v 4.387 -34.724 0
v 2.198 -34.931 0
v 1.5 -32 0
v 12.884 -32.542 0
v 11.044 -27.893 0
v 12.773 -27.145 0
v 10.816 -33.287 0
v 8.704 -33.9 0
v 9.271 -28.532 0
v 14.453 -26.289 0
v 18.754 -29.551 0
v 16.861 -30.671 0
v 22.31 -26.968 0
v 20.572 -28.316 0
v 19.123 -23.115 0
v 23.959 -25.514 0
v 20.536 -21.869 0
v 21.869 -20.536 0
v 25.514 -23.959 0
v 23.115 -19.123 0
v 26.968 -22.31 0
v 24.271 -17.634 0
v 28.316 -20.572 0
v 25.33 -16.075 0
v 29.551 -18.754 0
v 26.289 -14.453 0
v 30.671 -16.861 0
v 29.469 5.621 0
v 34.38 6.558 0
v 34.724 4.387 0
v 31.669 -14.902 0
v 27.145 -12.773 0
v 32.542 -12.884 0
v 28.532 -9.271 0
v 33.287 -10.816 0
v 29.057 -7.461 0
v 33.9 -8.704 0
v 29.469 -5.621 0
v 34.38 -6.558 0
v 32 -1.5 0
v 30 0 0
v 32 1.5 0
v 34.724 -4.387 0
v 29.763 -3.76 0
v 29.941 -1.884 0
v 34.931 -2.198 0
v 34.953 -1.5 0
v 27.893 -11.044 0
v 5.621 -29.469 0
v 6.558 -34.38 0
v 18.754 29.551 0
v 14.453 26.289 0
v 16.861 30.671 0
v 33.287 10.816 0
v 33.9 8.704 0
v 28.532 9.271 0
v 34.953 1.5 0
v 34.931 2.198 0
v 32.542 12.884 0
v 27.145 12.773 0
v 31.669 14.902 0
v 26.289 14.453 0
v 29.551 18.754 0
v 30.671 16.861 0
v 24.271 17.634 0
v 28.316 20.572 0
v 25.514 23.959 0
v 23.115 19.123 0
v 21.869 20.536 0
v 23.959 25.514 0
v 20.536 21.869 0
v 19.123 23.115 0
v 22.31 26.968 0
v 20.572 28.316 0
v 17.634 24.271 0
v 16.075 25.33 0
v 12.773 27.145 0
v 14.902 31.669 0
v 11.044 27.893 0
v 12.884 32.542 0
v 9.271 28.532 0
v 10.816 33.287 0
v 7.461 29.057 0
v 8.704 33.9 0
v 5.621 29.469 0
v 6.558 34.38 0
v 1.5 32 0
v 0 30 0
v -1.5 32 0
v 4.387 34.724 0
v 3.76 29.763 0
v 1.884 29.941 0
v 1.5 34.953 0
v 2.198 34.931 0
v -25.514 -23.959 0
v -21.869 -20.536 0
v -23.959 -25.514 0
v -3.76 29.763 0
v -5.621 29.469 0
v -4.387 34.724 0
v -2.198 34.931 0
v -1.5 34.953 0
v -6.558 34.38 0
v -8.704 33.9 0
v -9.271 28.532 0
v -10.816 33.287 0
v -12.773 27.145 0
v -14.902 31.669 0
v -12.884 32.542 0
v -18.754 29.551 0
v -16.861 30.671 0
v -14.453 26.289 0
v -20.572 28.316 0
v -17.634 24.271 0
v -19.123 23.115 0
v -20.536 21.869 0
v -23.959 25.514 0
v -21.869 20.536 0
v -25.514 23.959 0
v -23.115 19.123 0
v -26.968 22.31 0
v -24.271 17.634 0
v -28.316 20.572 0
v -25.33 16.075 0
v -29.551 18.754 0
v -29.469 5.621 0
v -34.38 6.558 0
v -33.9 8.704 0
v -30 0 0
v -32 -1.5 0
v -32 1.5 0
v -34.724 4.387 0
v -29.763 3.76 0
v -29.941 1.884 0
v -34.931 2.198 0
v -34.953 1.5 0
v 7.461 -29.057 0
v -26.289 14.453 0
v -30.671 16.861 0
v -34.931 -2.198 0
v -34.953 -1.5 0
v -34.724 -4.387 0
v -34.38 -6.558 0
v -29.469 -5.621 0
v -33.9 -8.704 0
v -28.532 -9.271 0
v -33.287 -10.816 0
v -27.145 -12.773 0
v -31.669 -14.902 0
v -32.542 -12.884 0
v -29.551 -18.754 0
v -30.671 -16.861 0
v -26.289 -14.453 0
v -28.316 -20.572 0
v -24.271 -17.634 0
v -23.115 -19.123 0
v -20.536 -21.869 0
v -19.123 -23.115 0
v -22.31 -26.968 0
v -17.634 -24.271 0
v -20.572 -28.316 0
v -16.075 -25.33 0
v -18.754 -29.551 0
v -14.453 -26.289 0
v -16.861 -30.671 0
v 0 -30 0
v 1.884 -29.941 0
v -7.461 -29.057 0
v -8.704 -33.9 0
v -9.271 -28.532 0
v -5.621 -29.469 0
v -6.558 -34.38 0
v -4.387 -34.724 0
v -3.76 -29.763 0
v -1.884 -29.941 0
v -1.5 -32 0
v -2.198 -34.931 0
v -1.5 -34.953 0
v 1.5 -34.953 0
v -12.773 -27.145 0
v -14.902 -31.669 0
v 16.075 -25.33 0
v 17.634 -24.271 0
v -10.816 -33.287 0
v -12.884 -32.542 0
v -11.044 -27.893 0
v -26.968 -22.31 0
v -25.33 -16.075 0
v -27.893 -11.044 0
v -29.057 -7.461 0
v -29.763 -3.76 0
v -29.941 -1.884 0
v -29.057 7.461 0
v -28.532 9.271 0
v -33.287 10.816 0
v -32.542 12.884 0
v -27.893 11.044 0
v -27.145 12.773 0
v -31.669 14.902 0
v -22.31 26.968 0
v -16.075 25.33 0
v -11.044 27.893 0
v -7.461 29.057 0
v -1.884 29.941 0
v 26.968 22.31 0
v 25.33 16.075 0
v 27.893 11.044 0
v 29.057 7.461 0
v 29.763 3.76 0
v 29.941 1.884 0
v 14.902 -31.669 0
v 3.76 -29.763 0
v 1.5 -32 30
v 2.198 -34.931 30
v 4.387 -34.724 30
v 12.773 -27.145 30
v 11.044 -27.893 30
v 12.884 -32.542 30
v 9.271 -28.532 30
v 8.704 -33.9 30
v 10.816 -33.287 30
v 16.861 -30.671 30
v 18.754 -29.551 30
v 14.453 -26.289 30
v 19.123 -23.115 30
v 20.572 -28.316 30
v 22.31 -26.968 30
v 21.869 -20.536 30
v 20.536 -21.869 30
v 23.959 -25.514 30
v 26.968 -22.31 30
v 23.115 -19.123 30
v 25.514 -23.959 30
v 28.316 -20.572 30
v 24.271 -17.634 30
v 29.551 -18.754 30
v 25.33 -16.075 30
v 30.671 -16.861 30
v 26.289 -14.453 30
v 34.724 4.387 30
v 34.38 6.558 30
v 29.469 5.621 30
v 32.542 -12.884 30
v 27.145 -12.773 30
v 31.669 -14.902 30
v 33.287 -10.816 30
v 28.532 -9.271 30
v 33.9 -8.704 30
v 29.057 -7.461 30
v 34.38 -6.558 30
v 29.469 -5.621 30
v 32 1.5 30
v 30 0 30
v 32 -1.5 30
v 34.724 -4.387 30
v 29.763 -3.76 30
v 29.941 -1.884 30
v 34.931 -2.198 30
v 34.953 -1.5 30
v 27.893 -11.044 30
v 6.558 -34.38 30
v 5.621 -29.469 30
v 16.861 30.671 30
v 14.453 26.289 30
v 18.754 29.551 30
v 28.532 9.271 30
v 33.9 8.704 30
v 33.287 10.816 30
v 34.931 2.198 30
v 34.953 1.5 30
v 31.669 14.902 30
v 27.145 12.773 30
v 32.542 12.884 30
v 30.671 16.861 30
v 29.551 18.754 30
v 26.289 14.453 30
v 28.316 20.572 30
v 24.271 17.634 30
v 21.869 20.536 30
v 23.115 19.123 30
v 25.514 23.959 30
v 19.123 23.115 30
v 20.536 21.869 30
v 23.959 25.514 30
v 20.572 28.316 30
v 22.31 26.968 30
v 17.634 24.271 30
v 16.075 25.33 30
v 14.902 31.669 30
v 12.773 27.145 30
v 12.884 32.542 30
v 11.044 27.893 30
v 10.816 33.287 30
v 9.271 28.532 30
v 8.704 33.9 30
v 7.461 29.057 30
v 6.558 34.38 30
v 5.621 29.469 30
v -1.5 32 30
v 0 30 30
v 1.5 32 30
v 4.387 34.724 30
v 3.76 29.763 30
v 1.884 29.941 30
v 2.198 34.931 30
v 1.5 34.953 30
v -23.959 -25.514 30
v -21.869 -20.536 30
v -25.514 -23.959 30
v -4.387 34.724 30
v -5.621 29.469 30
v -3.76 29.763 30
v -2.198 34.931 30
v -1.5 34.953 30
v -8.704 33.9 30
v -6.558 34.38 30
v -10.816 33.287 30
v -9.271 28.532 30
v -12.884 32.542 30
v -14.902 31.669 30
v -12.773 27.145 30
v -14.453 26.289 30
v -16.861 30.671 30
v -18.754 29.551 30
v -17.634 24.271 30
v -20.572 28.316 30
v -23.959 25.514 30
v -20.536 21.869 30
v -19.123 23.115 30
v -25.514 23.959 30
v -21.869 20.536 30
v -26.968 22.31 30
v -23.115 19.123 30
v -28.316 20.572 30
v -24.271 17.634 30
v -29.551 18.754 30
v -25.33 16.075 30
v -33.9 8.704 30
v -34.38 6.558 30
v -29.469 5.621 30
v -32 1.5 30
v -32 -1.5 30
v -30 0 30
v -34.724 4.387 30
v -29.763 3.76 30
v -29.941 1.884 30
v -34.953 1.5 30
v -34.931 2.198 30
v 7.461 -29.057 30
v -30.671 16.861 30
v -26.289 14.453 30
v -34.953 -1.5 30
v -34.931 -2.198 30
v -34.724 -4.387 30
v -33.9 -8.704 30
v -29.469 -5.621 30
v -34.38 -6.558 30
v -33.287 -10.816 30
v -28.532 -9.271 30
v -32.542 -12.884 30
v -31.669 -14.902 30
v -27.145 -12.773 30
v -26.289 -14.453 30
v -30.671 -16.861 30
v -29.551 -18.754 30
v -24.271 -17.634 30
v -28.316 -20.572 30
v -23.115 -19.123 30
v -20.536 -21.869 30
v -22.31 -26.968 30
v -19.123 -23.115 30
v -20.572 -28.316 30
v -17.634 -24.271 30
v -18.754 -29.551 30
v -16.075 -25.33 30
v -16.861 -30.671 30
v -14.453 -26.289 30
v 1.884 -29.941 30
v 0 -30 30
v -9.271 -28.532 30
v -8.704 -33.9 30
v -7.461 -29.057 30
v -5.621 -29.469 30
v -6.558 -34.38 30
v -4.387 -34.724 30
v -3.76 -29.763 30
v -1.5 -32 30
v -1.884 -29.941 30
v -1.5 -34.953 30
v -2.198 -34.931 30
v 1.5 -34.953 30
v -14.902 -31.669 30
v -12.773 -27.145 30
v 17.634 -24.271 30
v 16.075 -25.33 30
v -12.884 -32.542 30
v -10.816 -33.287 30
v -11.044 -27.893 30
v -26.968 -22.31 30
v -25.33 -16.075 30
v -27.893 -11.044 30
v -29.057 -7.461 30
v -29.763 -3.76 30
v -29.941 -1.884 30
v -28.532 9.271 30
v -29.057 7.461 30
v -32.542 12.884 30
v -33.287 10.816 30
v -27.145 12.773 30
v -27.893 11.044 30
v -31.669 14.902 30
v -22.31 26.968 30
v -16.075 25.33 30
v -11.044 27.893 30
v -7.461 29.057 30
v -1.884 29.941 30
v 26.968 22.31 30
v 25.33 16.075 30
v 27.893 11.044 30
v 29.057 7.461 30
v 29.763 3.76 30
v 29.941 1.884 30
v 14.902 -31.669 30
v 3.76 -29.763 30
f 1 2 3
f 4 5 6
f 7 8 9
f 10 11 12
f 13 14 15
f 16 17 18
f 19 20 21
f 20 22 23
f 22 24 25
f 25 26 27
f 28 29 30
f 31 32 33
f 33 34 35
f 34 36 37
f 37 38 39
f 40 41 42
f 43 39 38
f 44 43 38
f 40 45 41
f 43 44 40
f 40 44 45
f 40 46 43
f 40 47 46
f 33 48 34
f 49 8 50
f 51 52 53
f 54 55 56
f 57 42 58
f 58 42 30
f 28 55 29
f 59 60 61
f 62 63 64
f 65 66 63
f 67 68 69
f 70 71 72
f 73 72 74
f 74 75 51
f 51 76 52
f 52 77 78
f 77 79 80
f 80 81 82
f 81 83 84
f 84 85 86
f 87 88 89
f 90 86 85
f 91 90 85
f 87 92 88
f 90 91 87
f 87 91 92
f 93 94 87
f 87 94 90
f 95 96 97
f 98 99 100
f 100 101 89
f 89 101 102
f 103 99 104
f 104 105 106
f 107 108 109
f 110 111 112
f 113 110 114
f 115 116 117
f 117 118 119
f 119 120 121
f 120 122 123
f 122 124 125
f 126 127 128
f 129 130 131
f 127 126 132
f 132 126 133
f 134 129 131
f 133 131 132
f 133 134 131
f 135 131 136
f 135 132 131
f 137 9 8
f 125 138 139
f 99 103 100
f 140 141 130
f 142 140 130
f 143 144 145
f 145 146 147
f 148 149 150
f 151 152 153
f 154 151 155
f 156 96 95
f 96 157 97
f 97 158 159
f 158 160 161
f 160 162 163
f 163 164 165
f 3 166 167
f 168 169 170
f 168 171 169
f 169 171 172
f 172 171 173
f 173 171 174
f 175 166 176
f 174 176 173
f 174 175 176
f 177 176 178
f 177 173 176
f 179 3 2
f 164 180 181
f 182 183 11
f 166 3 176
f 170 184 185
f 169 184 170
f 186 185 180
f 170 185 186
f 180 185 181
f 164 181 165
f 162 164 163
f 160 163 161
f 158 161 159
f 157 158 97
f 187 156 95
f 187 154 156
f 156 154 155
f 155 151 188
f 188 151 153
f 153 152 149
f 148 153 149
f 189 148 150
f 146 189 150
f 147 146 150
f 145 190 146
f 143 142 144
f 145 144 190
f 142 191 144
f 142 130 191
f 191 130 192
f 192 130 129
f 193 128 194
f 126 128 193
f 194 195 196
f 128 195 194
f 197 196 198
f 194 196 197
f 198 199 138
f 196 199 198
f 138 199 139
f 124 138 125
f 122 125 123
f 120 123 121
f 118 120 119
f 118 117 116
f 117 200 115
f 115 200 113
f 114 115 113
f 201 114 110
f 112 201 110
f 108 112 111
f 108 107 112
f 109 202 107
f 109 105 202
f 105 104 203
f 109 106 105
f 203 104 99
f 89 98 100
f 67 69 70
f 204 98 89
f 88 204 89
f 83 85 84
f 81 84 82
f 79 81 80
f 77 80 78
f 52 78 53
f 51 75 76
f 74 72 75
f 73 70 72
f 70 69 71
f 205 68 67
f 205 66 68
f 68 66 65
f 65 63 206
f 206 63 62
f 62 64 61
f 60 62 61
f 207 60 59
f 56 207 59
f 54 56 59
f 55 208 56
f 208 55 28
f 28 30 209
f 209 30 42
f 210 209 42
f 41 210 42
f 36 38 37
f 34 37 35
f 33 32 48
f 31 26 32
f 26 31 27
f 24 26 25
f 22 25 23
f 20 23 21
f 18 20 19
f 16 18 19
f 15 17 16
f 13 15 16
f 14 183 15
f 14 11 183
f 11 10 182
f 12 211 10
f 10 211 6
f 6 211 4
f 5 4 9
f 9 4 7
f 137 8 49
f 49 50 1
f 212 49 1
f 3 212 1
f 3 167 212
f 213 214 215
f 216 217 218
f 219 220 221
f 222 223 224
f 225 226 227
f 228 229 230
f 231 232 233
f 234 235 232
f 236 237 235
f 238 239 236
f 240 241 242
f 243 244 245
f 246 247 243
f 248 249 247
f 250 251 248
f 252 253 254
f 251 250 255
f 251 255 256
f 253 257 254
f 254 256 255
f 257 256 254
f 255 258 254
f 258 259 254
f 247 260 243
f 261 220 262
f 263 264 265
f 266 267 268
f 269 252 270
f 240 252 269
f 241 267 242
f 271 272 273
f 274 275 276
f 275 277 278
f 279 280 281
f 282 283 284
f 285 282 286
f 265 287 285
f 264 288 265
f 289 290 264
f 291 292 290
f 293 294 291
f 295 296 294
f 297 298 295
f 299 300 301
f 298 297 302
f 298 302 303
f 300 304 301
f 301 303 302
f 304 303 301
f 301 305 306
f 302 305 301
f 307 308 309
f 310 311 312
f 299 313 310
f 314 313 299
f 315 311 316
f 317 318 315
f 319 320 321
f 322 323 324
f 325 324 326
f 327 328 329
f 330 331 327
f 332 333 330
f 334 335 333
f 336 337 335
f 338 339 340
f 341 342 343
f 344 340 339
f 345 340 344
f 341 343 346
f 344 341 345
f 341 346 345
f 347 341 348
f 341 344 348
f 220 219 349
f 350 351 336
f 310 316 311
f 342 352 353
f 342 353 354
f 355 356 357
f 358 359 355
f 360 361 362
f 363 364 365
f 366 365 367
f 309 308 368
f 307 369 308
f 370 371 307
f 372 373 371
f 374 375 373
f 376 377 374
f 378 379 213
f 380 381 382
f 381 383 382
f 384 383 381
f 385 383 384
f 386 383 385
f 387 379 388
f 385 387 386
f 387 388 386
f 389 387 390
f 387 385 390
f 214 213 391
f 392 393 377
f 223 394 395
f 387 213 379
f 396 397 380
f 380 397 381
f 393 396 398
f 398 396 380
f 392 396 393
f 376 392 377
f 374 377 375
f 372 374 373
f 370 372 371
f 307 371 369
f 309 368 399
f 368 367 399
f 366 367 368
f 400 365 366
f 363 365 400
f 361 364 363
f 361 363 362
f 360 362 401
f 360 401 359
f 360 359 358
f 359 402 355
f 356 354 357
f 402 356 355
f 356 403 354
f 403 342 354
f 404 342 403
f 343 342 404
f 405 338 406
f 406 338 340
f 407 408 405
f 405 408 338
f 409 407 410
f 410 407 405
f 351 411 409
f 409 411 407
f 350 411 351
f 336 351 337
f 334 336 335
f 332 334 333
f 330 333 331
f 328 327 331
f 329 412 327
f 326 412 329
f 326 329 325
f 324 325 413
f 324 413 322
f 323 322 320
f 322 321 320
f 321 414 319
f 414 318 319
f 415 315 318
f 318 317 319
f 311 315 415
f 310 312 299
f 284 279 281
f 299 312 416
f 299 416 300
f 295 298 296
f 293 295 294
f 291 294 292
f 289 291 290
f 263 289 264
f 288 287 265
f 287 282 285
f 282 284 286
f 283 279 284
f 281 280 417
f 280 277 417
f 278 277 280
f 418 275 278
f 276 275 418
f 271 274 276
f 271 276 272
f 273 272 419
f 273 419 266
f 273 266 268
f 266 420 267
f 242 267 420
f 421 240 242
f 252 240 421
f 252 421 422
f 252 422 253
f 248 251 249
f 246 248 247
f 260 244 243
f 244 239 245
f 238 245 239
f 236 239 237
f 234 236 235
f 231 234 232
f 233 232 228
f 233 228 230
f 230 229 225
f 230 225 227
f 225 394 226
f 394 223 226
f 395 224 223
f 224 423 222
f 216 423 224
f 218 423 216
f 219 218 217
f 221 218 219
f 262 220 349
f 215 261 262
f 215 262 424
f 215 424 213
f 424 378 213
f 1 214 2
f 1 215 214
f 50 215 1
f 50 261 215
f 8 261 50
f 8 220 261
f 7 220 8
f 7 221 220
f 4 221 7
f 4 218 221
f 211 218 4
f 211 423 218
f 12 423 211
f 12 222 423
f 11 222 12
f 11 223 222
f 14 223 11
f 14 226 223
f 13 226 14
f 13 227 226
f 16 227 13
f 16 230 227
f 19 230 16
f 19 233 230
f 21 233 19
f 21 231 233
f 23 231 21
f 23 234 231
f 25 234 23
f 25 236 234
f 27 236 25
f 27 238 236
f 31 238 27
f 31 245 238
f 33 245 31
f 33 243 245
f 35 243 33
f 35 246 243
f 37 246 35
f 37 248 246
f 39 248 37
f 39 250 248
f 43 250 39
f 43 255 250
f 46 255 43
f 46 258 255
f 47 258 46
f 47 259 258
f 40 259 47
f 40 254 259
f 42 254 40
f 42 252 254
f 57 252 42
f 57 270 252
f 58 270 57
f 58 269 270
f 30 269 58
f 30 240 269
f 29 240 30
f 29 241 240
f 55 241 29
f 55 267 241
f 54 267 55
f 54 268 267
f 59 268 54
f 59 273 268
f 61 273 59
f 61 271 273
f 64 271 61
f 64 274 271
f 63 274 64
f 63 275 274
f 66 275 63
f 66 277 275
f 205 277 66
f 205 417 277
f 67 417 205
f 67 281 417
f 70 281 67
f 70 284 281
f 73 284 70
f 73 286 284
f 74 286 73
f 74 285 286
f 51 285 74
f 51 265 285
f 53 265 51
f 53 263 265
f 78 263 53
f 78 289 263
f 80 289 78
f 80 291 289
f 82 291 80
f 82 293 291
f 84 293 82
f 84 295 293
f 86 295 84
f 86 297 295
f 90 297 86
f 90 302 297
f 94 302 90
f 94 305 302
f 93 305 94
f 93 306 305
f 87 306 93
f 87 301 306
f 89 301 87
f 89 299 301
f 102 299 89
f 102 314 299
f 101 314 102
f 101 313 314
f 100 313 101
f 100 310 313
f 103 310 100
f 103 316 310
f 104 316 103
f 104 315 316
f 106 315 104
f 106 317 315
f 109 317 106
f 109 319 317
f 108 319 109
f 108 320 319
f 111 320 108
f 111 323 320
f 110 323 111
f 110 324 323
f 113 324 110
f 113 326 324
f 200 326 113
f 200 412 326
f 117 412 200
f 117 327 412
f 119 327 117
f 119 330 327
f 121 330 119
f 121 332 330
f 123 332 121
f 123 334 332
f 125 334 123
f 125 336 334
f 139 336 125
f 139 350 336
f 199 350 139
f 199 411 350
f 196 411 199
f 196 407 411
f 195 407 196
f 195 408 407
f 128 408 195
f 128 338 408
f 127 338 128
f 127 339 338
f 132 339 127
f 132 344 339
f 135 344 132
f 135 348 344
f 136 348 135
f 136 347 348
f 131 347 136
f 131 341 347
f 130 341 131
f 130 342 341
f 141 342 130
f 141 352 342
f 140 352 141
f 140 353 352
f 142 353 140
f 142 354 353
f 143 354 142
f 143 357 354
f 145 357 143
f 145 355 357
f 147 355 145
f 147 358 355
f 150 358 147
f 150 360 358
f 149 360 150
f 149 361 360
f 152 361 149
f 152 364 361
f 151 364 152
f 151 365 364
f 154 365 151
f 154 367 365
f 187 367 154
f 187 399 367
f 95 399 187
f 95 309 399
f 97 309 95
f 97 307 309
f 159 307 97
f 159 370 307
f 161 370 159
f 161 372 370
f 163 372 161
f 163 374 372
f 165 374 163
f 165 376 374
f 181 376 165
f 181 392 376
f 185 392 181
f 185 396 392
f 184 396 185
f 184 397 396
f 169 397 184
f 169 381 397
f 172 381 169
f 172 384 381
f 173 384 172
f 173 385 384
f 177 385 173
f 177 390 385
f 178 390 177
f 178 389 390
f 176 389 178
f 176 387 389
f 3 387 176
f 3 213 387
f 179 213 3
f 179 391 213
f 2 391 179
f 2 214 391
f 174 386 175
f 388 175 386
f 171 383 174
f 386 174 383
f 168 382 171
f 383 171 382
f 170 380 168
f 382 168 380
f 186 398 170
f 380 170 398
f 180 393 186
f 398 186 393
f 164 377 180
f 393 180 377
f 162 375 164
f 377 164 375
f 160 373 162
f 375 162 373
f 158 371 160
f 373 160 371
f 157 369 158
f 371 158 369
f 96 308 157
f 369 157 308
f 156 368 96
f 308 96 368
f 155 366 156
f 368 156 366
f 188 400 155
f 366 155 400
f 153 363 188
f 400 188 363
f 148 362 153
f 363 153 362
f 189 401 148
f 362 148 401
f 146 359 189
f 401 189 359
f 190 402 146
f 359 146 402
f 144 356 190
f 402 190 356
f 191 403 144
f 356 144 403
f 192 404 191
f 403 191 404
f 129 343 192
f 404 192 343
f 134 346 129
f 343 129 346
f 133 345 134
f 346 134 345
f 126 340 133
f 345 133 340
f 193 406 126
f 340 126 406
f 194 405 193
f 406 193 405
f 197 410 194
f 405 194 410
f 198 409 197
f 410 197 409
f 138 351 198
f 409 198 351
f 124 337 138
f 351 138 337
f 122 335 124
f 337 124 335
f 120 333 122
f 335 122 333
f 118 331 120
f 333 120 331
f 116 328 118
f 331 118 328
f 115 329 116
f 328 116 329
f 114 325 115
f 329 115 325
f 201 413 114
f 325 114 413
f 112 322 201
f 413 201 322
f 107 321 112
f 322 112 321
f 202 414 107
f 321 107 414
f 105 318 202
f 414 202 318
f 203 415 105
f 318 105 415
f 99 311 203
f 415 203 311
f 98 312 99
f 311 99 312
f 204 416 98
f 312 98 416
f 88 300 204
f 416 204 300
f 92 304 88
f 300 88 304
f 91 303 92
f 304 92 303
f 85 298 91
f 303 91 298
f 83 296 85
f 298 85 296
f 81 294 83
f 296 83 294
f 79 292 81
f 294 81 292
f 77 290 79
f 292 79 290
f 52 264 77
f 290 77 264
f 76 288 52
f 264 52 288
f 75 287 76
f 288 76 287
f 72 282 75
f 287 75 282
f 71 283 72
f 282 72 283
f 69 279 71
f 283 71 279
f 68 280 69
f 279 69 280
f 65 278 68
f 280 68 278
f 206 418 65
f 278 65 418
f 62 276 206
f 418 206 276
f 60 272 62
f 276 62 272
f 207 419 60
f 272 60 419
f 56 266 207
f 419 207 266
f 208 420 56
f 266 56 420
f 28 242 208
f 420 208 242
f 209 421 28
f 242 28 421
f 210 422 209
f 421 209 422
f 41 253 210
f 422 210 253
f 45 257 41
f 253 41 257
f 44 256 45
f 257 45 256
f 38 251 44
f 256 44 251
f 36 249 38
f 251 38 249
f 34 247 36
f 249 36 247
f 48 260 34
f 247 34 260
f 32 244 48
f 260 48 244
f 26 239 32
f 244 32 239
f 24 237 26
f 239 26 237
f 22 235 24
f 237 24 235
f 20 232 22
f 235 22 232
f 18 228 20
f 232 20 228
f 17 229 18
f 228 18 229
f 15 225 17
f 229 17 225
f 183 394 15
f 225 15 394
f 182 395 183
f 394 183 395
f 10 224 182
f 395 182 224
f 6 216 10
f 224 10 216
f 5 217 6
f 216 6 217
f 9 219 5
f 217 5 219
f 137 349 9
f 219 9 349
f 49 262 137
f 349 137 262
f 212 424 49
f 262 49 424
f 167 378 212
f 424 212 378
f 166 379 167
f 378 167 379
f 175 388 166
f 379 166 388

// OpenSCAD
linear_extrude(30){
    difference(){
        circle(35,$fn=100);
        circle(30,$fn=100);
        translate([32,-1.5,0]) square([5,3]);
        translate([-37,-1.5,0]) square([5,3]);
        translate([-1.5,32,0]) square([3,5]);
        translate([-1.5,-37,0]) square([3,5]);
    }
}
